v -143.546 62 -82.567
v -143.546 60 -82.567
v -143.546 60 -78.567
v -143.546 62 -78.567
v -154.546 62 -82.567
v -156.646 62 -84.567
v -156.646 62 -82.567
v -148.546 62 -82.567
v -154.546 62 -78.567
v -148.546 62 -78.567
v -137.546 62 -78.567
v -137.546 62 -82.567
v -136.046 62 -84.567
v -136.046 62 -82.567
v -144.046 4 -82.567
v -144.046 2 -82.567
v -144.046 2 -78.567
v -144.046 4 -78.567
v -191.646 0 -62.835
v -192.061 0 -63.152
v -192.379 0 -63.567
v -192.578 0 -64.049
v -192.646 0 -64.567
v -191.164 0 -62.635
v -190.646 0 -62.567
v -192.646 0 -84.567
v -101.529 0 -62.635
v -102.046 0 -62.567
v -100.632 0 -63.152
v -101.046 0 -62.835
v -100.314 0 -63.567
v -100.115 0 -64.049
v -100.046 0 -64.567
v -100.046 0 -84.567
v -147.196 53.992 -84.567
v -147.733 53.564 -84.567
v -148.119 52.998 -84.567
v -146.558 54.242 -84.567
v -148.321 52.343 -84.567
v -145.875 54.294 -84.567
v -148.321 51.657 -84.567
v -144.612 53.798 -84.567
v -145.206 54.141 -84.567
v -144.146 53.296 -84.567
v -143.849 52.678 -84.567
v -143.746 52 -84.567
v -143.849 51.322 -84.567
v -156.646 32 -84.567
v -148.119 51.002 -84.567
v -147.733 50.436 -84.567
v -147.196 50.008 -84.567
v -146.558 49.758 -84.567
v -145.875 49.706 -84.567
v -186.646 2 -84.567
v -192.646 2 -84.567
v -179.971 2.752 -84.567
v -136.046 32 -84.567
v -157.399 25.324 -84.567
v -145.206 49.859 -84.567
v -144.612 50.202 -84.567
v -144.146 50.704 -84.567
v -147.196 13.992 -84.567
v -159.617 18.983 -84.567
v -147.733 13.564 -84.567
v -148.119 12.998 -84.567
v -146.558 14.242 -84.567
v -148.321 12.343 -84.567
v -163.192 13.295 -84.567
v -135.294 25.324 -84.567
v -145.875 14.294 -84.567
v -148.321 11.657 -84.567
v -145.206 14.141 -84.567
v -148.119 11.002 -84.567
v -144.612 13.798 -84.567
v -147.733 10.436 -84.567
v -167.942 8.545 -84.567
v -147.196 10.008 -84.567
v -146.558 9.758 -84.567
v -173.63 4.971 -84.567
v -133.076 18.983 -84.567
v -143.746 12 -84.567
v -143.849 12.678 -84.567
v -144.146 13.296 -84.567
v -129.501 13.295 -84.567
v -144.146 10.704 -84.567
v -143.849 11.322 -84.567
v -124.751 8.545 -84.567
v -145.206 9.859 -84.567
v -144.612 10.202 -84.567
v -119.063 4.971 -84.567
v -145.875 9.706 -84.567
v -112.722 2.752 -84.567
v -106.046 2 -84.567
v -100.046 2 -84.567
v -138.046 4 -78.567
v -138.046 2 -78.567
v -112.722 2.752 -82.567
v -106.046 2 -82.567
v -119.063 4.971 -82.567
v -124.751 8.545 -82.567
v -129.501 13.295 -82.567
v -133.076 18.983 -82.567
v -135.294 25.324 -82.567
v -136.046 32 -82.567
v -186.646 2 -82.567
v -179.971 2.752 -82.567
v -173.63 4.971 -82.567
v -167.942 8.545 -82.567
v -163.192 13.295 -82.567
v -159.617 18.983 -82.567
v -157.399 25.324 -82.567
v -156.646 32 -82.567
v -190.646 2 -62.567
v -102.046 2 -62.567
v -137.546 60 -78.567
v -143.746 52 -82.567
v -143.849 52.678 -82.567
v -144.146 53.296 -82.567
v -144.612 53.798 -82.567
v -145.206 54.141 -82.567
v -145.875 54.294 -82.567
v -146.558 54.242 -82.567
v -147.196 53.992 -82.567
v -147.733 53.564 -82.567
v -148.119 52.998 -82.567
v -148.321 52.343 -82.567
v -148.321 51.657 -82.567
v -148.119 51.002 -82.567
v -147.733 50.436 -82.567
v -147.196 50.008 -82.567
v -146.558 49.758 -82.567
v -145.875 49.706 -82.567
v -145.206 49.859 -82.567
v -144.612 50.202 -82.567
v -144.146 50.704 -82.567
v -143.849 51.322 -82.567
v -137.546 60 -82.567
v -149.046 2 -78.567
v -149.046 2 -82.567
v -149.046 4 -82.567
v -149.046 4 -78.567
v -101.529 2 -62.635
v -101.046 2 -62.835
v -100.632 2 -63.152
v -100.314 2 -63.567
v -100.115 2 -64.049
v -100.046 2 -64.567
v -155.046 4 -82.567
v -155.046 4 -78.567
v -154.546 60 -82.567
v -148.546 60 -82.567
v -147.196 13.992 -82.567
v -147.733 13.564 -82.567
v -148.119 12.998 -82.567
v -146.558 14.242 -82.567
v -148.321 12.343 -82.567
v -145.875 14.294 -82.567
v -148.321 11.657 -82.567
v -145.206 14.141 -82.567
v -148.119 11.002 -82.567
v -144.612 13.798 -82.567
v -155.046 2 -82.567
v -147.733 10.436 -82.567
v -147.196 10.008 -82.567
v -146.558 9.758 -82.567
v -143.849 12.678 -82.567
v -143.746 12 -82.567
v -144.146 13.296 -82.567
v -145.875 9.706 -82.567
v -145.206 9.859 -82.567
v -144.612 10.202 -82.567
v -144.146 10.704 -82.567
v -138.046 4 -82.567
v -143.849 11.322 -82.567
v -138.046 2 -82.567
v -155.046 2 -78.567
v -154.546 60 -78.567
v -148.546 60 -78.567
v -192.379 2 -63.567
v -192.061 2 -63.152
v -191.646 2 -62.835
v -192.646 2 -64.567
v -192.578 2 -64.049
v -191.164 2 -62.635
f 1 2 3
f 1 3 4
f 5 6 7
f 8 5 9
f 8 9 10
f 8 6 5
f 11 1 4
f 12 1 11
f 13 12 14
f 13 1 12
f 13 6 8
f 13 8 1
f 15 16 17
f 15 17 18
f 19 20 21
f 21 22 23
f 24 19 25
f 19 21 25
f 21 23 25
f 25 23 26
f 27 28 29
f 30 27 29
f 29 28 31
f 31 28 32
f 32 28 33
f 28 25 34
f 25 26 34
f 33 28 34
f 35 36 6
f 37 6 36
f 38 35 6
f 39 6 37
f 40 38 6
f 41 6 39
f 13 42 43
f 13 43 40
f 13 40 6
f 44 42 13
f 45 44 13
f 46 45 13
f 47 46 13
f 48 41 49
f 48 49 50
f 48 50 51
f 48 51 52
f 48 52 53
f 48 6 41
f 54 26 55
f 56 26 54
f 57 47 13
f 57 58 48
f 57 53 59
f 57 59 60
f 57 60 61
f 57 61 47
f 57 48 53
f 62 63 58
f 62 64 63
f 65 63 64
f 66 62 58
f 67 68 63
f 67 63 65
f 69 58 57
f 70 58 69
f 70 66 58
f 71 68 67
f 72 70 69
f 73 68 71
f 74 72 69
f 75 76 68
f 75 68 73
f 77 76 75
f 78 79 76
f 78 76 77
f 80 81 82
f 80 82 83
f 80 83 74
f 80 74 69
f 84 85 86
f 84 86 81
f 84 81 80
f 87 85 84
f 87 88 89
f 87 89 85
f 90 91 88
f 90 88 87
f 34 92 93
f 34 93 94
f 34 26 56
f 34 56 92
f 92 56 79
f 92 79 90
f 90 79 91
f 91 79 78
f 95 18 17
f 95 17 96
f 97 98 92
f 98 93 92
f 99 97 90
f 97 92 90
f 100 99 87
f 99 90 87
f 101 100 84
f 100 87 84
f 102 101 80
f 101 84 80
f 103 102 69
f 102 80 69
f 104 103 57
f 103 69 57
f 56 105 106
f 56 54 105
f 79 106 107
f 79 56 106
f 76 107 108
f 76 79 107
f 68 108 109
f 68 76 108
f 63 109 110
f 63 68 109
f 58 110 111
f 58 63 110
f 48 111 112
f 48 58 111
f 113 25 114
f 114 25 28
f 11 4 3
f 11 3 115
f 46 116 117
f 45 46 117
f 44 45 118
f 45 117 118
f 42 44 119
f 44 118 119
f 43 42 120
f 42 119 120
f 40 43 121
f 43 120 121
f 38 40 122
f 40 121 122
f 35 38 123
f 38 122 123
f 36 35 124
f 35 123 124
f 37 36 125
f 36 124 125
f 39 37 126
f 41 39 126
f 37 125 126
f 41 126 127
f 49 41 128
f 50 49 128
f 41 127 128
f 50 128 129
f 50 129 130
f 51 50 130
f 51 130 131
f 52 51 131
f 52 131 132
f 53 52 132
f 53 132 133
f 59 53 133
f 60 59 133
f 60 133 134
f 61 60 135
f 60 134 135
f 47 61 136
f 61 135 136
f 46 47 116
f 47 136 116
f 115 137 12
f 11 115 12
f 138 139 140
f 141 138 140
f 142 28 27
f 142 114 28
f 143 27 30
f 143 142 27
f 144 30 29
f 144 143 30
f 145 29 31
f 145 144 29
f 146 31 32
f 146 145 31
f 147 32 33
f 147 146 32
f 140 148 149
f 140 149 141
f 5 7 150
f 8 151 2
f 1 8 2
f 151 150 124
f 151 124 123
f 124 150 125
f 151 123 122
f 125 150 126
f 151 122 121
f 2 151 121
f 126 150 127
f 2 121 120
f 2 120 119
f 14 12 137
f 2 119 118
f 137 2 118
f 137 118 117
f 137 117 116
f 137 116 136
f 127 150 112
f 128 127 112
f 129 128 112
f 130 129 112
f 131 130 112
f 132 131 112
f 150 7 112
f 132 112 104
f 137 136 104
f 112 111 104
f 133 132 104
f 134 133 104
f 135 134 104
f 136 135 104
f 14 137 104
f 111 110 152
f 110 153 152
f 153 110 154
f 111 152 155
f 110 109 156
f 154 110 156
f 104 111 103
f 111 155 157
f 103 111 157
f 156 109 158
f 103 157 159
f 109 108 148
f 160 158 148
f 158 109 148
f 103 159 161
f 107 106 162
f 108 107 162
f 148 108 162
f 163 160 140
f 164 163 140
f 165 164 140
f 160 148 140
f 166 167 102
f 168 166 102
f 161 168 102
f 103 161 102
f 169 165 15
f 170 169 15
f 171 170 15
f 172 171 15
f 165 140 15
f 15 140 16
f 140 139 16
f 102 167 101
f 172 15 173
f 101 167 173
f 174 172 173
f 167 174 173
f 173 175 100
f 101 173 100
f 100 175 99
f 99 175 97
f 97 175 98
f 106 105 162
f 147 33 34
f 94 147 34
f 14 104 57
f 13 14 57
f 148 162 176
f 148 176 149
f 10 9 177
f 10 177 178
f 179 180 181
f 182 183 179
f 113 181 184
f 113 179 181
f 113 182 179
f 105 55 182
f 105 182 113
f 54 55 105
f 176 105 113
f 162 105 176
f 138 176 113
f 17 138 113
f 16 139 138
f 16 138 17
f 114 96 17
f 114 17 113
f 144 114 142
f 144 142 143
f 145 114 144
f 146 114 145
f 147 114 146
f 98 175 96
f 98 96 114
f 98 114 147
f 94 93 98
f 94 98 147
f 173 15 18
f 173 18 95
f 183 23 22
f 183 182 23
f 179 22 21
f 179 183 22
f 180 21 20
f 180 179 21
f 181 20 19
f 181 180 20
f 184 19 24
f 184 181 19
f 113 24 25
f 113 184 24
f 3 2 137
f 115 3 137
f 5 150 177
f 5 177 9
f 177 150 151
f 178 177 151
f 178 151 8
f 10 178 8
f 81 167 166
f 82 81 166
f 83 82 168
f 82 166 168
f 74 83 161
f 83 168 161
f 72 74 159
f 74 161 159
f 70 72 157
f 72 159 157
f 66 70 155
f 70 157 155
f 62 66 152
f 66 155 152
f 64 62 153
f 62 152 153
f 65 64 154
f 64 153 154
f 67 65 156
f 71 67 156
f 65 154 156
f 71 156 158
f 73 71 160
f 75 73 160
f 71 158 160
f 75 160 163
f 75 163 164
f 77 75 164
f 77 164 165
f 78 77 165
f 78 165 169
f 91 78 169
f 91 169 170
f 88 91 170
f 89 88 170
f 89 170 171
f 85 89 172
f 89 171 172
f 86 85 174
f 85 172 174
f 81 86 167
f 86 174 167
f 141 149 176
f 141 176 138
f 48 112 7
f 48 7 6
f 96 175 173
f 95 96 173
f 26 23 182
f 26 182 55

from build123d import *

# Parameters (mm, degrees)
SKETCH1_W           = 92.6
SKETCH1_H           = 22
BOSS_EXTRUDE1_DEPTH = 2
FILLET1_R           = 2
SKETCH5_W           = 20.6
SKETCH5_H           = 2
BOSS_EXTRUDE3_DEPTH = 60
SKETCH6_W           = 6
SKETCH6_H           = 2
BOSS_EXTRUDE4_DEPTH = 4
SKETCH7_R           = 2.3
CUT_EXTRUDE1_DEPTH  = 2
FILLET4_R           = 30


with BuildPart() as part:
    # Sketch1 → Boss-Extrude1 (new body)
    with BuildSketch(Plane(origin=(0, 0, 0), x_dir=(1, 0, 0), z_dir=(0, 1, 0))):
        with Locations((-146.346488806, 73.566618989)):
            Rectangle(SKETCH1_W, SKETCH1_H)
    extrude(amount=BOSS_EXTRUDE1_DEPTH)

    # Fillet1
    fillet1_edges = [part.edges().sort_by_distance(p)[0] for p in [
        (-100.046488806, 1, -62.566618989),
        (-192.646488806, 1, -62.566618989),
    ]]
    fillet(fillet1_edges, radius=FILLET1_R)

    # Sketch5 → Boss-Extrude3 (add)
    with BuildSketch(Plane(origin=(0, 2, 0), x_dir=(1, 0, 0), z_dir=(0, 1, 0))):
        with Locations((-146.346488806, 83.566618989)):
            Rectangle(SKETCH5_W, SKETCH5_H)
    extrude(amount=BOSS_EXTRUDE3_DEPTH)

    # Sketch6 → Boss-Extrude4 (add)
    with BuildSketch(Plane.XY.offset(-82.566618989)):
        with Locations((-151.546488806, 61)):
            Rectangle(SKETCH6_W, SKETCH6_H)
        with Locations((-140.546488806, 61)):
            Rectangle(SKETCH6_W, SKETCH6_H)
        with Locations((-152.046488806, 3)):
            Rectangle(SKETCH6_W, SKETCH6_H)
        with Locations((-141.046488806, 3)):
            Rectangle(SKETCH6_W, SKETCH6_H)
    extrude(amount=BOSS_EXTRUDE4_DEPTH)

    # Sketch7 → Cut-Extrude1 (cut)
    with BuildSketch(Plane.XY.offset(-82.566618989)):
        with Locations((-146.046488806, 52)):
            Circle(SKETCH7_R)
        with Locations((-146.046488806, 12)):
            Circle(SKETCH7_R)
    extrude(amount=-CUT_EXTRUDE1_DEPTH, mode=Mode.SUBTRACT)

    # Fillet4
    fillet4_edges = [part.edges().sort_by_distance(p)[0] for p in [
        (-156.646488806, 2, -83.566618989),
        (-136.046488806, 2, -83.566618989),
    ]]
    fillet(fillet4_edges, radius=FILLET4_R)


solid = part.part
